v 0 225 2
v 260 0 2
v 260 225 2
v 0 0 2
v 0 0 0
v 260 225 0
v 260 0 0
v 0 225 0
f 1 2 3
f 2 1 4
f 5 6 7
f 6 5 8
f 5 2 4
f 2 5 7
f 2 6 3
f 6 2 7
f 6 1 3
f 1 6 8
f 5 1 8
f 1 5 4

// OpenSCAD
// file: parametre.scad
// pour la finesse de rendu
// plus c'est élevé, mieux c'est... mais ça prend plus de temps et de ressource
resolution = 50;


// définition de base du jeu
nombre_colonnes = 7;
nombre_lignes = 6;

// pour stocker les cables et l'électronique
espace_vide_milieu = 40; 

// cadrillage autour des LEDs
hauteur_separateur_led = 15;


// les boutons de sélection de colonne et du nombre de joueurs
diametre_bouton_arcade = 30;
rayon_bouton_arcade = diametre_bouton_arcade / 2;
diametre_trou_bouton_arcade = 20;
rayon_trou_bouton_arcade = diametre_trou_bouton_arcade / 2;

// le mur Star Wars fenetré
epaisseur_tole_mur = 2;
marge_mur = 10; // pour aérer le tout
taille_fenetre = diametre_bouton_arcade; // valeur à fixer si bouton plus petit;
ecart_entre_fenetre = 5; // au jugé ;)

largeur_mur = marge_mur + (nombre_colonnes * taille_fenetre) + ((nombre_colonnes - 1) * ecart_entre_fenetre) + marge_mur;
echo("largeur_mur=", largeur_mur);
hauteur_mur = marge_mur + (nombre_lignes * taille_fenetre) + ((nombre_lignes - 1) * ecart_entre_fenetre) + marge_mur;
echo("hauteur_mur=", hauteur_mur);

// le plexi blanc derrière le mur, pour faire les fenêtres
epaisseur_plexi_blanc = 2;

// calcul de l'épaisseur complete du jeu
epaisseur_jeu = espace_vide_milieu + 2 * epaisseur_tole_mur + 2 * epaisseur_plexi_blanc + 2 * hauteur_separateur_led;

// la plaque du dessus avec les boutons de choix de colonne
epaisseur_tole_dessus = 2;
marge_profondeur_dessus = (epaisseur_jeu - diametre_bouton_arcade) / 2;
echo("marge_profondeur_dessus=", marge_profondeur_dessus);
marge_largeur_dessus = (largeur_mur - (nombre_colonnes * diametre_bouton_arcade) - ((nombre_colonnes - 1) * ecart_entre_fenetre)) / 2;
echo("marge_largeur_dessus=", marge_largeur_dessus);
// main file
include <parametre.scad>

plexi_blanc();

// plexi blanc
module plexi_blanc() {
    color([1, 1, 1]) cube(size=[largeur_mur, hauteur_mur, epaisseur_plexi_blanc]);
}
